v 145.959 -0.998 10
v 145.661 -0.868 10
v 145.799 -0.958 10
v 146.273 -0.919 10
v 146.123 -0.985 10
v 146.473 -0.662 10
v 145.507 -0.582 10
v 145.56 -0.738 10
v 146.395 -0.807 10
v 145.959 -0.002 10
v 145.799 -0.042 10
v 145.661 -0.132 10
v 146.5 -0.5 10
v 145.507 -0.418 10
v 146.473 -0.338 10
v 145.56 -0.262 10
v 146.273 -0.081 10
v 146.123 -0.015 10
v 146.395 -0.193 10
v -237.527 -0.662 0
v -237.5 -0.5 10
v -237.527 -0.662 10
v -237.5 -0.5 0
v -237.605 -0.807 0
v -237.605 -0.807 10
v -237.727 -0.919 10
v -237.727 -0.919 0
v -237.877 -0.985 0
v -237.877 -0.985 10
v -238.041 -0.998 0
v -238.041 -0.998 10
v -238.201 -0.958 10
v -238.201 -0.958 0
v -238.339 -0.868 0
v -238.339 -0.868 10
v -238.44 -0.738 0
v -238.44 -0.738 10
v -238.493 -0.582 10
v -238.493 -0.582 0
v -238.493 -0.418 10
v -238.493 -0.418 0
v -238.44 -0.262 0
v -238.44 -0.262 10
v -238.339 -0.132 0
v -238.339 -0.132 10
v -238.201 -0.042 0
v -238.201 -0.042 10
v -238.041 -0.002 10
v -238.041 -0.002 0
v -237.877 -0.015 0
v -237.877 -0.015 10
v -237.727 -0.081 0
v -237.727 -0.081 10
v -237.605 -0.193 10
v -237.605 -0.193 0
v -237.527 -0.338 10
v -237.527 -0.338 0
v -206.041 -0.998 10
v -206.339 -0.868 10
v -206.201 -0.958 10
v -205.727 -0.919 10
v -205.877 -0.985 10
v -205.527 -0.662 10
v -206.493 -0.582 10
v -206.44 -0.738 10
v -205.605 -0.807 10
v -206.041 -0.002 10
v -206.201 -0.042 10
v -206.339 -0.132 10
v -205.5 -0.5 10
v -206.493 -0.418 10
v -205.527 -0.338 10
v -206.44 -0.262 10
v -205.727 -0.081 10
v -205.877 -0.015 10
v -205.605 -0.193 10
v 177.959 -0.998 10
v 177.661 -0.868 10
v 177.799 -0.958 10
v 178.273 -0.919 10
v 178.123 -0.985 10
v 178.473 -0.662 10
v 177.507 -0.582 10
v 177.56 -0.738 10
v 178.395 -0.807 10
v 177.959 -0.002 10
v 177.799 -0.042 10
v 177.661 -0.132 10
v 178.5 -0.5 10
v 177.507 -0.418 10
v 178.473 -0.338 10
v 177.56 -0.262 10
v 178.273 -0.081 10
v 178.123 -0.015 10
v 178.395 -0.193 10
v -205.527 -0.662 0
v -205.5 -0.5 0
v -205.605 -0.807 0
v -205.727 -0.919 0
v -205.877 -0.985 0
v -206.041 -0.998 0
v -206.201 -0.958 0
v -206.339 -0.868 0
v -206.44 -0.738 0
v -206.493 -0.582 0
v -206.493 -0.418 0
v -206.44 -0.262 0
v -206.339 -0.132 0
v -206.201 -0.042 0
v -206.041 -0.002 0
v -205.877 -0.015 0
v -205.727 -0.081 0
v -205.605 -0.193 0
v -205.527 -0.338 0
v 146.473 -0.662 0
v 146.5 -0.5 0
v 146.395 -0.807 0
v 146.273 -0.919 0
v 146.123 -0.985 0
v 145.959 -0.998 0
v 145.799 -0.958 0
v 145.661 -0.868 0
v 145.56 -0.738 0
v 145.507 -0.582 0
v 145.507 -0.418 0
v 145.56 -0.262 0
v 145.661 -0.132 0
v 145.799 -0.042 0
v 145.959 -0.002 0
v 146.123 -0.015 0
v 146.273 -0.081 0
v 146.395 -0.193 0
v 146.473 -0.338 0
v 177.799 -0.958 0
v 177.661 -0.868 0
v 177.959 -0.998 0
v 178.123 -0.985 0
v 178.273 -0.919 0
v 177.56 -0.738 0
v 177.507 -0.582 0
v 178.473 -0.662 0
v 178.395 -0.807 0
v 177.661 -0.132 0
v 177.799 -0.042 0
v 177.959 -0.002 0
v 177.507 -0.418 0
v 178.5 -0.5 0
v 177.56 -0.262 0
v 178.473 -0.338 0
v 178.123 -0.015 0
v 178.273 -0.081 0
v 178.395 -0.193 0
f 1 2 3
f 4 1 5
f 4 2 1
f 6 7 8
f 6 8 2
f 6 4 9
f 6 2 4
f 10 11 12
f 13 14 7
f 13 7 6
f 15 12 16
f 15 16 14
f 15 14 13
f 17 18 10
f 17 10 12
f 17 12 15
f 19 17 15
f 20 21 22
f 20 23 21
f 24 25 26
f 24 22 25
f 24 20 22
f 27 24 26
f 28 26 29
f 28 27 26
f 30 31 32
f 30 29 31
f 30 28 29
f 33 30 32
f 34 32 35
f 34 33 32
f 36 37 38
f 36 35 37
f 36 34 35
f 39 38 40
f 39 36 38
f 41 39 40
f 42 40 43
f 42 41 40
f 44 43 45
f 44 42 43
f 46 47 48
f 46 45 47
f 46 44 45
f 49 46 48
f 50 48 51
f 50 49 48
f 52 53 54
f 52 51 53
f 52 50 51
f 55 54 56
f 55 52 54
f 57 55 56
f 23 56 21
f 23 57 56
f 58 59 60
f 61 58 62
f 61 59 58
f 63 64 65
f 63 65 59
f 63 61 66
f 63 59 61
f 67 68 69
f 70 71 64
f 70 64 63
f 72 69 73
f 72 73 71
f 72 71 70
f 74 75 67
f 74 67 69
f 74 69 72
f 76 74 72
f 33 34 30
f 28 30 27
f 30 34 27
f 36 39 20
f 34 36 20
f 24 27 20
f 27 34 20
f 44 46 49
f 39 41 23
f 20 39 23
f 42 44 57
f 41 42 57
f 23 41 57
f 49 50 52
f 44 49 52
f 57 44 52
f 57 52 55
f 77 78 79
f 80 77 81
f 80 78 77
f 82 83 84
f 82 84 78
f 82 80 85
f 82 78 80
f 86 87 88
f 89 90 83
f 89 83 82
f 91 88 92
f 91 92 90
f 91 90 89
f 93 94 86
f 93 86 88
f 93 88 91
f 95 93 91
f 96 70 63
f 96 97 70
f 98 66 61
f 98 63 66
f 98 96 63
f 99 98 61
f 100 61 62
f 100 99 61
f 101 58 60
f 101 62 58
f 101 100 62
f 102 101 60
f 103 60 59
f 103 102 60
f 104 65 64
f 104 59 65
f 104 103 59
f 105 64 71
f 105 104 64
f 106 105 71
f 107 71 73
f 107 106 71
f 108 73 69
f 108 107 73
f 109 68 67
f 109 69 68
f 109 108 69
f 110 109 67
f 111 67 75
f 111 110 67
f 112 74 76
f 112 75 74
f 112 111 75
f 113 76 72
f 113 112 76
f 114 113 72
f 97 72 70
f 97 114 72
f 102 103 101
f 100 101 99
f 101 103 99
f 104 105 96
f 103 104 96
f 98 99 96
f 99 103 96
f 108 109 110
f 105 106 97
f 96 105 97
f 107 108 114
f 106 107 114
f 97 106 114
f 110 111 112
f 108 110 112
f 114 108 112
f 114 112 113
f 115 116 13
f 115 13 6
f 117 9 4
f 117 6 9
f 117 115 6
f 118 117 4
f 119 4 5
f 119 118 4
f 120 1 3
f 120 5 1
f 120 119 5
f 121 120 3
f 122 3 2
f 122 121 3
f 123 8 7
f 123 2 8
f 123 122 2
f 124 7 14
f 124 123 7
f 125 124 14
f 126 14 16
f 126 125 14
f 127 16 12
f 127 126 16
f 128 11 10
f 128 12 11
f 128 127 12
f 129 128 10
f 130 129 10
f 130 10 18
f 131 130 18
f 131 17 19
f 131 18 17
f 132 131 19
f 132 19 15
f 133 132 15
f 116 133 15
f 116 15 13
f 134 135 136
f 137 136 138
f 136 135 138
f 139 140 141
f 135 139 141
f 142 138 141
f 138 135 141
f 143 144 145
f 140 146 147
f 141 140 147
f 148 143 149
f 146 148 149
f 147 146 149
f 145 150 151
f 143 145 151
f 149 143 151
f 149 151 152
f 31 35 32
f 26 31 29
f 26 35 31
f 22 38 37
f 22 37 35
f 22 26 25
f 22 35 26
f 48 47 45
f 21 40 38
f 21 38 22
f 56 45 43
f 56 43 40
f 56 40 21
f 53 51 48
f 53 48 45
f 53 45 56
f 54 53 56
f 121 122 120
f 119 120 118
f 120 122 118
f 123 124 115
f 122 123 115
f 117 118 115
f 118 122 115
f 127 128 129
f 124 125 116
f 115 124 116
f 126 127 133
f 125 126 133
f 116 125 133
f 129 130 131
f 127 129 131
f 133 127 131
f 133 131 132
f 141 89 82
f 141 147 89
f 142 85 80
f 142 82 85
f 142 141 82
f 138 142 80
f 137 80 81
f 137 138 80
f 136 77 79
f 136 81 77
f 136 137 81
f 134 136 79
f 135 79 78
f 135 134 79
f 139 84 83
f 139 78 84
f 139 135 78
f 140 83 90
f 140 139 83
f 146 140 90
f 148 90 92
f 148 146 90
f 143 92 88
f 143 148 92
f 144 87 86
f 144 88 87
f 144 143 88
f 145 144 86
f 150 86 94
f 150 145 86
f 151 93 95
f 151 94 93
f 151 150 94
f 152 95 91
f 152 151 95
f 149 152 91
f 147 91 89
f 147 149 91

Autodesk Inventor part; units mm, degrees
ref_plane "YZ Plane" through (0, 0, 0) normal (1, 0, 0) x (0, 1, 0)
ref_plane "XZ Plane" through (0, 0, 0) normal (0, 1, 0) x (-1, 0, 0)
ref_plane "XY Plane" through (0, 0, 0) normal (0, 0, 1) x (1, 0, 0)
sketch "Sketch1" plane through (0, 0, 0) normal (0, 0, 1) x (1, 0, 0)
  line L0 (-300, -9) -> (300, -9)
  line L1 (300, -9) -> (300, 9)
  line L2 (300, 9) -> (-300, 9)
  line L3 (-300, 9) -> (-300, -9)
  line L4 (-300, -9) -> (300, 9) construction
  line L5 (300, -9) -> (-300, 9) construction
  point P0 (0, 0)
  dimension "d0" = 600
  dimension "d1" = 18
sketch "Sketch2" plane through (0, 0, 0) normal (0, 0, 1) x (1, 0, 0)
  circle A0 centre (178, -0.5) radius 0.5
  line L0 (300, 9) -> (-300, 9) projected
  line L1 (-300, -9) -> (300, -9) projected
  line L2 (0, -12.6) -> (0, 12.6) projected
  line L3 (300, -9) -> (300, 9) projected
  point P0 (0, 0)
  dimension "d3" = 9.5
  dimension "d4" = 1
  dimension "d26" = 122
extrude "Extrusion1" add sketch "Sketch2" along normal blind 10 contours A0
pattern_linear "Minifix Array" count 2 spacing 416 along (-1, 0, 0) of "Extrusion1"
sketch "Sketch3" plane through (0, 0, 0) normal (0, 0, 1) x (1, 0, 0)
  circle A0 centre (146, -0.5) radius 0.5
  circle A1 centre (178, -0.5) radius 0.5 projected
  point P0 (0, 0)
  dimension "d11" = 32
extrude "Extrusion2" add sketch "Sketch3" along normal blind 10 separate body contours A0
pattern_of_one "Left Dowel Array" bodies 2
sketch "Sketch4" plane through (0, 0, 0) normal (0, 0, 1) x (1, 0, 0)
  line L0 (-300, 9) -> (-300, -9) projected
  circle A0 centre (-206, -0.5) radius 0.5
  circle A1 centre (178, -0.5) radius 0.5 projected
  line L1 (300, -9) -> (300, 9) projected
  point P0 (0, 0)
  dimension "d17" = 122
  dimension "d28" = 506
extrude "Extrusion3" add sketch "Sketch4" along normal blind 10 separate body contours A0
pattern_of_one "Right Dowel Array" bodies 3
equation "\"d3\" = Y_Coord"
equation "\"d26\" = X_Coord"
equation "\"d9\" = Step"
equation "\"d16\" = Step"
equation "\"d28\" = PlacingWithByStep + X_Coord - PlacingStep"
equation "\"d23\" = Step"
equation "\"d0\" = ContactPatchWidth"
equation "\"d1\" = ContactPatchHeight"
equation "\"ContactPatchWidth\" = 600"
equation "\"ContactPatchHeight\" = 18"
equation "\"PlacingStep\" = 32"
equation "\"PlacingWithByStep\" = 416"
equation "\"X_Coord\" = 122"
equation "\"Step\" = 416"
equation "\"Y_Coord\" = 9.5"
equation "\"MaxDistBetweenByStep\" = 192"
properties part number "Minifix&Dowel Joint 11100"
